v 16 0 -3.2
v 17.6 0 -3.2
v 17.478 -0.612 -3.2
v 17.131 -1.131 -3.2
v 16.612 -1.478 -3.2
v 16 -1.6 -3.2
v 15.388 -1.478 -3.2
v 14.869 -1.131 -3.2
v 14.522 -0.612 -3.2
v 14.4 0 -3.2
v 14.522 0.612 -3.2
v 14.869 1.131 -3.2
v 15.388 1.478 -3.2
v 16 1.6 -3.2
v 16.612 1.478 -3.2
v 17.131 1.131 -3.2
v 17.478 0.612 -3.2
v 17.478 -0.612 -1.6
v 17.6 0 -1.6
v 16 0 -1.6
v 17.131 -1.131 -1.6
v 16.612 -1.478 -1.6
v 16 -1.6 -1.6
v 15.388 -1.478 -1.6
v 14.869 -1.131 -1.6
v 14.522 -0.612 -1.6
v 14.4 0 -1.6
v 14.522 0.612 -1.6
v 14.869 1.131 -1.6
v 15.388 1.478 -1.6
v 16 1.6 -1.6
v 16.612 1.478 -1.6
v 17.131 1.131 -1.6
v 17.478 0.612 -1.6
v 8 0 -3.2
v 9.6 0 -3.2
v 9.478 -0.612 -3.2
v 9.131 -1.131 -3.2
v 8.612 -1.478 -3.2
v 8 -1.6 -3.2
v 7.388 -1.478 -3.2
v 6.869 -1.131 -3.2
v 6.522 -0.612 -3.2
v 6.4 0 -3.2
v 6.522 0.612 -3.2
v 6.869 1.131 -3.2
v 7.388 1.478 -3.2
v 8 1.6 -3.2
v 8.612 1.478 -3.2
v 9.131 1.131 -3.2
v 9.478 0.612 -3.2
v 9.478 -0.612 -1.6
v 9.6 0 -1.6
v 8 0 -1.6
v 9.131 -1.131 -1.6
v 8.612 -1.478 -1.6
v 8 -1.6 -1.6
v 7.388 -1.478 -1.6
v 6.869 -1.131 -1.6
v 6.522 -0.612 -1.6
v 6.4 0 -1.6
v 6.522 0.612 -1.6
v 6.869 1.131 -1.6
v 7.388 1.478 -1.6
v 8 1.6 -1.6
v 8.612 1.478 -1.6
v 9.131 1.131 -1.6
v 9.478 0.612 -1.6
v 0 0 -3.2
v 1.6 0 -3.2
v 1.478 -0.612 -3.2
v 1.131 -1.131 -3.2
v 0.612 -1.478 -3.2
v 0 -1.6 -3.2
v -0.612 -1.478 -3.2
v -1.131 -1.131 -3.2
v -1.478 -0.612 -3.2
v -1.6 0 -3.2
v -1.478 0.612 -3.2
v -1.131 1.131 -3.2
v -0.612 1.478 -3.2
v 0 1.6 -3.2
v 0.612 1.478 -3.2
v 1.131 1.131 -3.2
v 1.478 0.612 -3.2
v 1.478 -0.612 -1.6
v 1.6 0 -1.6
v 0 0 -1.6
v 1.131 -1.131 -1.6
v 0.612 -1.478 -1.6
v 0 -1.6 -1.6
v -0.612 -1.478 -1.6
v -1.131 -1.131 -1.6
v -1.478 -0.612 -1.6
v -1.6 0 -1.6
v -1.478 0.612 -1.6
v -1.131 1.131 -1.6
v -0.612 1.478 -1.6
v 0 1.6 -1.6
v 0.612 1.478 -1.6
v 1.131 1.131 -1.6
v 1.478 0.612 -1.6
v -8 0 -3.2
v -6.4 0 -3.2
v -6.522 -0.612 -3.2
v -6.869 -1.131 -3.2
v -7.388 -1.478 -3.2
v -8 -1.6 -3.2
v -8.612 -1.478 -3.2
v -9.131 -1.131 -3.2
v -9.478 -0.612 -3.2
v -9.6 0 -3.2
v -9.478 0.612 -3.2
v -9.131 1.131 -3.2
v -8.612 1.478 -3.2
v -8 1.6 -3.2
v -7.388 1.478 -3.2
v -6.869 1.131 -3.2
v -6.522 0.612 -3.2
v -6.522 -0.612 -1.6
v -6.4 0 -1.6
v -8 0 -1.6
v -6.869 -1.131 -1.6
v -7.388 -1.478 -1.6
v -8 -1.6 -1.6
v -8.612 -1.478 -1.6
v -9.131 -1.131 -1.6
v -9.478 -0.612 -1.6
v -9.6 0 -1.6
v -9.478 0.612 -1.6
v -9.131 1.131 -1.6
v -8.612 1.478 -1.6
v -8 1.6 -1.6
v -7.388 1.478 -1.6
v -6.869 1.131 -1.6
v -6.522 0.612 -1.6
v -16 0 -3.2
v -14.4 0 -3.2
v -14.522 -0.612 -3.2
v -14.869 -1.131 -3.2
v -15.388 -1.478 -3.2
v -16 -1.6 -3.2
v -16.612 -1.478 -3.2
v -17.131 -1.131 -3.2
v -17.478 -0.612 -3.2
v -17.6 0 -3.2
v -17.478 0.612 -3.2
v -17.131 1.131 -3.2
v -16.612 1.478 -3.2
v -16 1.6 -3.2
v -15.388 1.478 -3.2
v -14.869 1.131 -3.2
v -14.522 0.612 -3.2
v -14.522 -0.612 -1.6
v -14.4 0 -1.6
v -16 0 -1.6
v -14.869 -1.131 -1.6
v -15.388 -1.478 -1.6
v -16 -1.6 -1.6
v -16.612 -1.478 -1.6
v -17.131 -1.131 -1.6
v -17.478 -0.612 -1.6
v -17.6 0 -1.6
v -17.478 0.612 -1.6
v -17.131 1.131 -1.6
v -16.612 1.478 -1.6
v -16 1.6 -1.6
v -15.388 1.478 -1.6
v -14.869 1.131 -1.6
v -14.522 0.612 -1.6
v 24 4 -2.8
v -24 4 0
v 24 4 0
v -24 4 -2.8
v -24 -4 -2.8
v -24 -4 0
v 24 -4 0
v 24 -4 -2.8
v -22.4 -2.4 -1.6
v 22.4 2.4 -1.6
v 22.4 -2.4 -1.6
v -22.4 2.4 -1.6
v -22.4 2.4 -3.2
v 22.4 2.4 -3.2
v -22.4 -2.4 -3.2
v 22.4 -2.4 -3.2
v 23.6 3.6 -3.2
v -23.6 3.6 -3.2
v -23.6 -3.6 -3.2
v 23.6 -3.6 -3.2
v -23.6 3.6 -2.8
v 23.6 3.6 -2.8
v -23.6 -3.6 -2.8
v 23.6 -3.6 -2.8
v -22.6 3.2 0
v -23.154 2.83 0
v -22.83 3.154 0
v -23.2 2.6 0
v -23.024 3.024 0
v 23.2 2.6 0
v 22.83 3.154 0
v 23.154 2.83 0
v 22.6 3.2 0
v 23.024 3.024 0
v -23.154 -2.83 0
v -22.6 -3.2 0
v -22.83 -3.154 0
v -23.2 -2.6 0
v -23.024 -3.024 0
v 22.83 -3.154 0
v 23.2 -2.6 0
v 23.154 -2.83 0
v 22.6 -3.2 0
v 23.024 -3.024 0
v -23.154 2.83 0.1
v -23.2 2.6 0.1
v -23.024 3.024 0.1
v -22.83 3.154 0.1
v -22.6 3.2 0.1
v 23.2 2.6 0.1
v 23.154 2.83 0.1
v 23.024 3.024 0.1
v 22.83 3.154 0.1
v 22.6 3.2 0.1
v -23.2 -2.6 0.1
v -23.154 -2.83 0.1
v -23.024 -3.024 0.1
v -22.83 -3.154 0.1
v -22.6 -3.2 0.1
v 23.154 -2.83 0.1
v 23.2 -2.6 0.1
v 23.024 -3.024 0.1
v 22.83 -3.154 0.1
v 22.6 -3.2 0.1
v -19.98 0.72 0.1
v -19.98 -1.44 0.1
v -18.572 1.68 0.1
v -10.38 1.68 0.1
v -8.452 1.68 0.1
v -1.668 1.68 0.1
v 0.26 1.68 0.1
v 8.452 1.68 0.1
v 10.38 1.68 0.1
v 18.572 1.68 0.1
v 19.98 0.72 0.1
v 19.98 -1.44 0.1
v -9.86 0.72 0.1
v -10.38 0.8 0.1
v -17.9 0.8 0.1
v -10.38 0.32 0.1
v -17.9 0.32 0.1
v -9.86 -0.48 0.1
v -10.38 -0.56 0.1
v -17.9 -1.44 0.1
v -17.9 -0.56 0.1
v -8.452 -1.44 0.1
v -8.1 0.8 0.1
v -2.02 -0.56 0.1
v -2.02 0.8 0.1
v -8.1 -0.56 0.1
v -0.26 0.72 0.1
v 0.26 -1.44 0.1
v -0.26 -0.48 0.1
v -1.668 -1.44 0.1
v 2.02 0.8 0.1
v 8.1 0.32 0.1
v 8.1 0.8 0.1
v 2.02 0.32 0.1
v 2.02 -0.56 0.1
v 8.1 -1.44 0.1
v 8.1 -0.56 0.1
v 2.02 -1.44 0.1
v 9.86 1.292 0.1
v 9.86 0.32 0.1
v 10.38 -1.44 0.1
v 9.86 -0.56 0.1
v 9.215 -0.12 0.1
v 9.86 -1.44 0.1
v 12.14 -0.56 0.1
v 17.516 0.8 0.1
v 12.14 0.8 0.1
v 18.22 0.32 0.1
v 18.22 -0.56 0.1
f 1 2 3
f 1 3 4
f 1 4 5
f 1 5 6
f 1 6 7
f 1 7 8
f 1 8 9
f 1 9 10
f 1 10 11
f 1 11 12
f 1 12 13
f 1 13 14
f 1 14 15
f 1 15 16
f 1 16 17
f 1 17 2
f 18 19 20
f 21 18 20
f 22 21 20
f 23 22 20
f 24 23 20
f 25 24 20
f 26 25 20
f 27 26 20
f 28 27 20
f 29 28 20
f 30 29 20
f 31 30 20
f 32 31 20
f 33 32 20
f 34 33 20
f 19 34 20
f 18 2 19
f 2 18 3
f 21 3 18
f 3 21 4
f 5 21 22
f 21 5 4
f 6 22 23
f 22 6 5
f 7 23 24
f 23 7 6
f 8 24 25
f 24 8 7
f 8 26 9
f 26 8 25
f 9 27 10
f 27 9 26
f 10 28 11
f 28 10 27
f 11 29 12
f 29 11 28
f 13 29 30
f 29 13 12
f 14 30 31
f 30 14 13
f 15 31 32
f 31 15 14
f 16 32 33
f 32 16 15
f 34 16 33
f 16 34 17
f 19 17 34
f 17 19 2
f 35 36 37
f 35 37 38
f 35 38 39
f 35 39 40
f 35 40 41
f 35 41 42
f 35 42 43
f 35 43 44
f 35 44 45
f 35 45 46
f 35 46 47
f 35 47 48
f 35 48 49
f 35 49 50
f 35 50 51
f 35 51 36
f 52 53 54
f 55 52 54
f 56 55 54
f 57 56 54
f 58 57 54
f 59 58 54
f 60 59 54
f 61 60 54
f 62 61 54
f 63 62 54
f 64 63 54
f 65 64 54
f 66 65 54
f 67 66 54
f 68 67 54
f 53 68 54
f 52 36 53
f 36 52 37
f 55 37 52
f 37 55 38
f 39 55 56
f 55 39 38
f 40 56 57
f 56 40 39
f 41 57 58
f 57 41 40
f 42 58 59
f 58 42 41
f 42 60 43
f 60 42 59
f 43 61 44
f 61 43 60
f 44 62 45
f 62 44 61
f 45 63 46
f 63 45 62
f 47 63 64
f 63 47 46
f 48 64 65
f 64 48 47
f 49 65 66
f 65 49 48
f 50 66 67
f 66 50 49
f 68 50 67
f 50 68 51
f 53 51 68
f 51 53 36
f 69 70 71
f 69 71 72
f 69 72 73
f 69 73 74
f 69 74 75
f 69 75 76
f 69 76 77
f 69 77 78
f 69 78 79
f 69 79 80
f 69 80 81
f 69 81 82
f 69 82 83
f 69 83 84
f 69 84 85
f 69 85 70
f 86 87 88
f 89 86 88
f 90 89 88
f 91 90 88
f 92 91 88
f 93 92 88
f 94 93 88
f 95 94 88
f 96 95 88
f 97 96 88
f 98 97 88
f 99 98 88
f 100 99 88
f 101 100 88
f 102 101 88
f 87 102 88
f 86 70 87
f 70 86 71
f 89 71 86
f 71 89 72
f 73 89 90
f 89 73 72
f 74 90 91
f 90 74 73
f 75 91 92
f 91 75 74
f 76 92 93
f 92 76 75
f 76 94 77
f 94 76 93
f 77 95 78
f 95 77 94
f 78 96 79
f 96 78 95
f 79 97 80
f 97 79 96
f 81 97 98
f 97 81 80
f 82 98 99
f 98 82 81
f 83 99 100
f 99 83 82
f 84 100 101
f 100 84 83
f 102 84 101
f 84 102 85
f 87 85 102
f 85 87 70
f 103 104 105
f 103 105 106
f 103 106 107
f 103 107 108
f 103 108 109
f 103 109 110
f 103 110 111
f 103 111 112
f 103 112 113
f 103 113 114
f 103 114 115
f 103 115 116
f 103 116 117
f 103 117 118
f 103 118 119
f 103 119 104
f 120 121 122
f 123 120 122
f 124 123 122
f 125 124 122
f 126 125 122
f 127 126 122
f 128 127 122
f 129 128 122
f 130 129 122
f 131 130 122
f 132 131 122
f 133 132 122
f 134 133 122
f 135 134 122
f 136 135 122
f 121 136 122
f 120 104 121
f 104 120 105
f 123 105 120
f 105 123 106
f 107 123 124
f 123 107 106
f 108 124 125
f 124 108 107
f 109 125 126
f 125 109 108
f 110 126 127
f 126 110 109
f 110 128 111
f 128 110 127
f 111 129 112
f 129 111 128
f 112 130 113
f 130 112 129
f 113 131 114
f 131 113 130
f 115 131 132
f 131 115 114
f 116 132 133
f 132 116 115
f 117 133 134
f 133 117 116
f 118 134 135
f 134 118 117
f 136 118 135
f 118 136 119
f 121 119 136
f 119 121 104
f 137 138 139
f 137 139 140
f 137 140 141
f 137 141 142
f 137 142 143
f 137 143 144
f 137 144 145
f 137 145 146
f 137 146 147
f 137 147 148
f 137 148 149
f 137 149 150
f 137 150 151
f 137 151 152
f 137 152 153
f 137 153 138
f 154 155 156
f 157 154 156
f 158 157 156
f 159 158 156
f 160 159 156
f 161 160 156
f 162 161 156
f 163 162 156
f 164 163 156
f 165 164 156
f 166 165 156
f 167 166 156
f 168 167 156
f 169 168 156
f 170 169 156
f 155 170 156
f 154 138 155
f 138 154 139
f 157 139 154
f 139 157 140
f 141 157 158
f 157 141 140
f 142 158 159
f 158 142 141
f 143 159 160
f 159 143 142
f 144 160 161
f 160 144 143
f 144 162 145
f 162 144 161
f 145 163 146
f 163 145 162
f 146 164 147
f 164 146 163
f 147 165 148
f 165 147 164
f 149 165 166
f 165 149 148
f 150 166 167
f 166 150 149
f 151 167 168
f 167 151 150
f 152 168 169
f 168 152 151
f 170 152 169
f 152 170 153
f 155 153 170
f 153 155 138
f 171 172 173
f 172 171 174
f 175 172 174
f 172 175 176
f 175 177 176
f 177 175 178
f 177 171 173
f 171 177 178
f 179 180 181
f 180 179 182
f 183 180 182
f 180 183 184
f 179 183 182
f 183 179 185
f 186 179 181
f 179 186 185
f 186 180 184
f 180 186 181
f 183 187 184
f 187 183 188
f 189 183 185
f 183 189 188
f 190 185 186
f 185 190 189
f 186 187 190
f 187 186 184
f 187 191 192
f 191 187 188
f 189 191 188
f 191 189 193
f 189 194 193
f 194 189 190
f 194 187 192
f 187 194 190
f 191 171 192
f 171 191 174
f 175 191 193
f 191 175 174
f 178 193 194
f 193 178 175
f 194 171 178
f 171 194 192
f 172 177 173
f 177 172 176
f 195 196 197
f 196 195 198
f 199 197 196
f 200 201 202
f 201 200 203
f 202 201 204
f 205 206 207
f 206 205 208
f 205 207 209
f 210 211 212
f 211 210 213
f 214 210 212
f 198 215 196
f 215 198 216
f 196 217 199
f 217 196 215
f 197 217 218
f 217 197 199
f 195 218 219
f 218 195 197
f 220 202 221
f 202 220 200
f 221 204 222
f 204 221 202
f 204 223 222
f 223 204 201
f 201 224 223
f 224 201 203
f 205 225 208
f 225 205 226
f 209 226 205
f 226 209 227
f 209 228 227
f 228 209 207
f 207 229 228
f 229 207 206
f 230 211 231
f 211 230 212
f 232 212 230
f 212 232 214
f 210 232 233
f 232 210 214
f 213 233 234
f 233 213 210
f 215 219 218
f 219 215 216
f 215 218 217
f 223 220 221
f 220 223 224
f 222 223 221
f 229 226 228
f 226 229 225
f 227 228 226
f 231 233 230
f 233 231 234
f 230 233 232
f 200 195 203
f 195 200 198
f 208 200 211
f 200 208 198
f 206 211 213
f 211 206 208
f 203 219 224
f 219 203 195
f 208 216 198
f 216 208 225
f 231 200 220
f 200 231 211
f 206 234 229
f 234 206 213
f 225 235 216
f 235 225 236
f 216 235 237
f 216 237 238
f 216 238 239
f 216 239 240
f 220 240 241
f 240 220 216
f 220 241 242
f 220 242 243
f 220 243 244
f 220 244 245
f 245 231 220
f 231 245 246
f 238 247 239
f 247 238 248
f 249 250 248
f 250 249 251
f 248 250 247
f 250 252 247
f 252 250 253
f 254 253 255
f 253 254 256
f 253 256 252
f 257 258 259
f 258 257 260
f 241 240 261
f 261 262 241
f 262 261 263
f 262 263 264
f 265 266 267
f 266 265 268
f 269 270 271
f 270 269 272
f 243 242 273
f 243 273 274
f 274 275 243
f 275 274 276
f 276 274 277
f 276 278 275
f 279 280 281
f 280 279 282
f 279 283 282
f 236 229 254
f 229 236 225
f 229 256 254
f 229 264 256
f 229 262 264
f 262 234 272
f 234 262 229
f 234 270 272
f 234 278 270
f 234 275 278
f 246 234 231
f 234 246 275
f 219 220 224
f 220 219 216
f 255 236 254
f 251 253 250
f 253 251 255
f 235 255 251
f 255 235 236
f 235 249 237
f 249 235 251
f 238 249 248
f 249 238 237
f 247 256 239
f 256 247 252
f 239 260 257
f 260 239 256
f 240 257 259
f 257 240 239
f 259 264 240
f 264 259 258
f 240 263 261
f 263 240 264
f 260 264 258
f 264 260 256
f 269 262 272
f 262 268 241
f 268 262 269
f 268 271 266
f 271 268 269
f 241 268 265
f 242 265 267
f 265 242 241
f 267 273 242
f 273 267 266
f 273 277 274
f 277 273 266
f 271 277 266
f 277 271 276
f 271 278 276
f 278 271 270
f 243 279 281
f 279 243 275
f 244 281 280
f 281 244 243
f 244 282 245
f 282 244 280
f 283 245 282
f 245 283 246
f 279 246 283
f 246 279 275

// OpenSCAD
// file: ../p/4-4edge.scad
use <../lib.scad>
function ldraw_lib__4_4edge() = [
// 0 Circle 1.0
// 0 Name: 4-4edge.dat
// 0 Author: James Jessiman
// 0 !LDRAW_ORG Primitive UPDATE 2017-01
// 0 !LICENSE Licensed under CC BY 2.0 and CC BY 4.0 : see CAreadme.txt
// 
// 0 BFC CERTIFY CCW
  [0,"BFC","CERTIFY"],
  [0,"BFC","CCW"],
// 
// 0 !HISTORY 1998-12-15 [PTadmin] Official Update 1998-10
// 0 !HISTORY 2005-12-28 [PTadmin] Official Update 2005-01
// 0 !HISTORY 2007-06-24 [PTadmin] Header formatted for Contributor Agreement
// 0 !HISTORY 2008-07-01 [PTadmin] Official Update 2008-01
// 0 !HISTORY 2017-01-15 [Steffen] BFCed
// 0 !HISTORY 2017-12-30 [PTadmin] Official Update 2017-01
// 
// 
// 2 24 1 0 0 0.9239 0 0.3827
  [2,24,1,0,0,0.9239,0,0.3827],
// 2 24 0.9239 0 0.3827 0.7071 0 0.7071
  [2,24,0.9239,0,0.3827,0.7071,0,0.7071],
// 2 24 0.7071 0 0.7071 0.3827 0 0.9239
  [2,24,0.7071,0,0.7071,0.3827,0,0.9239],
// 2 24 0.3827 0 0.9239 0 0 1
  [2,24,0.3827,0,0.9239,0,0,1],
// 2 24 0 0 1 -0.3827 0 0.9239
  [2,24,0,0,1,-0.3827,0,0.9239],
// 2 24 -0.3827 0 0.9239 -0.7071 0 0.7071
  [2,24,-0.3827,0,0.9239,-0.7071,0,0.7071],
// 2 24 -0.7071 0 0.7071 -0.9239 0 0.3827
  [2,24,-0.7071,0,0.7071,-0.9239,0,0.3827],
// 2 24 -0.9239 0 0.3827 -1 0 -0
  [2,24,-0.9239,0,0.3827,-1,0,-0],
// 2 24 -1 0 -0 -0.9239 0 -0.3827
  [2,24,-1,0,-0,-0.9239,0,-0.3827],
// 2 24 -0.9239 0 -0.3827 -0.7071 0 -0.7071
  [2,24,-0.9239,0,-0.3827,-0.7071,0,-0.7071],
// 2 24 -0.7071 0 -0.7071 -0.3827 0 -0.9239
  [2,24,-0.7071,0,-0.7071,-0.3827,0,-0.9239],
// 2 24 -0.3827 0 -0.9239 0 0 -1
  [2,24,-0.3827,0,-0.9239,0,0,-1],
// 2 24 0 0 -1 0.3827 0 -0.9239
  [2,24,0,0,-1,0.3827,0,-0.9239],
// 2 24 0.3827 0 -0.9239 0.7071 0 -0.7071
  [2,24,0.3827,0,-0.9239,0.7071,0,-0.7071],
// 2 24 0.7071 0 -0.7071 0.9239 0 -0.3827
  [2,24,0.7071,0,-0.7071,0.9239,0,-0.3827],
// 2 24 0.9239 0 -0.3827 1 0 0
  [2,24,0.9239,0,-0.3827,1,0,0],
];
module ldraw_lib__4_4edge(step=0, col=false, unit=2/5, alt=false, line=0.2, solid=!$preview)
    makepoly(ldraw_lib__4_4edge(), step=step, col=col, unit=unit, alt=alt, line=line, solid=solid);
ldraw_lib__4_4edge(line=0.2);
// file: ../p/4-4disc.scad
use <../lib.scad>
function ldraw_lib__4_4disc() = [
// 0 Disc 1.0
// 0 Name: 4-4disc.dat
// 0 Author: James Jessiman
// 0 !LDRAW_ORG Primitive UPDATE 2002-02
// 0 !LICENSE Licensed under CC BY 2.0 and CC BY 4.0 : see CAreadme.txt
// 
// 0 BFC CERTIFY CCW
  [0,"BFC","CERTIFY"],
  [0,"BFC","CCW"],
// 
// 0 !HISTORY 1998-12-15 [PTadmin] Official Update 1998-10
// 0 !HISTORY 2002-03-23 [sbliss] Added BFC statement
// 0 !HISTORY 2002-04-25 [PTadmin] Official Update 2002-02
// 0 !HISTORY 2007-06-24 [PTadmin] Header formatted for Contributor Agreement
// 0 !HISTORY 2008-07-01 [PTadmin] Official Update 2008-01
// 
// 
// 3 16 0 0 0 1 0 0 0.9239 0 0.3827
  [3,16,0,0,0,1,0,0,0.9239,0,0.3827],
// 3 16 0 0 0 0.9239 0 0.3827 0.7071 0 0.7071
  [3,16,0,0,0,0.9239,0,0.3827,0.7071,0,0.7071],
// 3 16 0 0 0 0.7071 0 0.7071 0.3827 0 0.9239
  [3,16,0,0,0,0.7071,0,0.7071,0.3827,0,0.9239],
// 3 16 0 0 0 0.3827 0 0.9239 0 0 1
  [3,16,0,0,0,0.3827,0,0.9239,0,0,1],
// 3 16 0 0 0 0 0 1 -0.3827 0 0.9239
  [3,16,0,0,0,0,0,1,-0.3827,0,0.9239],
// 3 16 0 0 0 -0.3827 0 0.9239 -0.7071 0 0.7071
  [3,16,0,0,0,-0.3827,0,0.9239,-0.7071,0,0.7071],
// 3 16 0 0 0 -0.7071 0 0.7071 -0.9239 0 0.3827
  [3,16,0,0,0,-0.7071,0,0.7071,-0.9239,0,0.3827],
// 3 16 0 0 0 -0.9239 0 0.3827 -1 0 -0
  [3,16,0,0,0,-0.9239,0,0.3827,-1,0,-0],
// 3 16 0 0 0 -1 0 -0 -0.9239 0 -0.3827
  [3,16,0,0,0,-1,0,-0,-0.9239,0,-0.3827],
// 3 16 0 0 0 -0.9239 0 -0.3827 -0.7071 0 -0.7071
  [3,16,0,0,0,-0.9239,0,-0.3827,-0.7071,0,-0.7071],
// 3 16 0 0 0 -0.7071 0 -0.7071 -0.3827 0 -0.9239
  [3,16,0,0,0,-0.7071,0,-0.7071,-0.3827,0,-0.9239],
// 3 16 0 0 0 -0.3827 0 -0.9239 0 0 -1
  [3,16,0,0,0,-0.3827,0,-0.9239,0,0,-1],
// 3 16 0 0 0 0 0 -1 0.3827 0 -0.9239
  [3,16,0,0,0,0,0,-1,0.3827,0,-0.9239],
// 3 16 0 0 0 0.3827 0 -0.9239 0.7071 0 -0.7071
  [3,16,0,0,0,0.3827,0,-0.9239,0.7071,0,-0.7071],
// 3 16 0 0 0 0.7071 0 -0.7071 0.9239 0 -0.3827
  [3,16,0,0,0,0.7071,0,-0.7071,0.9239,0,-0.3827],
// 3 16 0 0 0 0.9239 0 -0.3827 1 0 0
  [3,16,0,0,0,0.9239,0,-0.3827,1,0,0],
// 0
];
module ldraw_lib__4_4disc(step=0, col=false, unit=2/5, alt=false, line=0.2, solid=!$preview)
    makepoly(ldraw_lib__4_4disc(), step=step, col=col, unit=unit, alt=alt, line=line, solid=solid);
ldraw_lib__4_4disc(line=0.2);
// file: ../p/4-4cyli.scad
use <../lib.scad>
$fa=1; $fs=0.2;
function ldraw_lib__4_4cyli(realsolid=false) = [
// 0 Cylinder 1.0
// 0 Name: 4-4cyli.dat
// 0 Author: James Jessiman
// 0 !LDRAW_ORG Primitive UPDATE 2005-01
// 0 !LICENSE Licensed under CC BY 2.0 and CC BY 4.0 : see CAreadme.txt
// 
// 0 BFC CERTIFY CCW
  [0,"BFC","CERTIFY"],
  [0,"BFC","CCW"],
// 
// 0 !HISTORY 1998-12-15 [PTadmin] Official Update 1998-10
// 0 !HISTORY 2002-03-23 [sbliss] Added BFC statement; merged headers from files in distributions LDraw 0.27 and Complete.
// 0 !HISTORY 2002-04-25 [PTadmin] Official Update 2002-02
// 0 !HISTORY 2004-12-14 [guyvivan] BFC CCW
// 0 !HISTORY 2005-12-28 [PTadmin] Official Update 2005-01
// 0 !HISTORY 2007-06-24 [PTadmin] Header formatted for Contributor Agreement
// 0 !HISTORY 2008-07-01 [PTadmin] Official Update 2008-01
// 
// 
// 4 16 1 1 0 0.9239 1 0.3827 0.9239 0 0.3827 1 0 0
  [4,16,1,1,0,0.9239,1,0.3827,0.9239,0,0.3827,1,0,0],
// 5 24 1 0 0 1 1 0 0.9239 0 0.3827 0.9239 0 -0.3827
  [5,24,1,0,0,1,1,0,0.9239,0,0.3827,0.9239,0,-0.3827],
// 4 16 0.9239 1 0.3827 0.7071 1 0.7071 0.7071 0 0.7071 0.9239 0 0.3827
  [4,16,0.9239,1,0.3827,0.7071,1,0.7071,0.7071,0,0.7071,0.9239,0,0.3827],
// 5 24 0.9239 0 0.3827 0.9239 1 0.3827 0.7071 0 0.7071 1 0 0
  [5,24,0.9239,0,0.3827,0.9239,1,0.3827,0.7071,0,0.7071,1,0,0],
// 4 16 0.7071 1 0.7071 0.3827 1 0.9239 0.3827 0 0.9239 0.7071 0 0.7071
  [4,16,0.7071,1,0.7071,0.3827,1,0.9239,0.3827,0,0.9239,0.7071,0,0.7071],
// 5 24 0.7071 0 0.7071 0.7071 1 0.7071 0.3827 0 0.9239 0.9239 0 0.3827
  [5,24,0.7071,0,0.7071,0.7071,1,0.7071,0.3827,0,0.9239,0.9239,0,0.3827],
// 4 16 0.3827 1 0.9239 0 1 1 0 0 1 0.3827 0 0.9239
  [4,16,0.3827,1,0.9239,0,1,1,0,0,1,0.3827,0,0.9239],
// 5 24 0.3827 0 0.9239 0.3827 1 0.9239 0 0 1 0.7071 0 0.7071
  [5,24,0.3827,0,0.9239,0.3827,1,0.9239,0,0,1,0.7071,0,0.7071],
// 4 16 0 1 1 -0.3827 1 0.9239 -0.3827 0 0.9239 0 0 1
  [4,16,0,1,1,-0.3827,1,0.9239,-0.3827,0,0.9239,0,0,1],
// 5 24 0 0 1 0 1 1 -0.3827 0 0.9239 0.3827 0 0.9239
  [5,24,0,0,1,0,1,1,-0.3827,0,0.9239,0.3827,0,0.9239],
// 4 16 -0.3827 1 0.9239 -0.7071 1 0.7071 -0.7071 0 0.7071 -0.3827 0 0.9239
  [4,16,-0.3827,1,0.9239,-0.7071,1,0.7071,-0.7071,0,0.7071,-0.3827,0,0.9239],
// 5 24 -0.3827 0 0.9239 -0.3827 1 0.9239 -0.7071 0 0.7071 0 0 1
  [5,24,-0.3827,0,0.9239,-0.3827,1,0.9239,-0.7071,0,0.7071,0,0,1],
// 4 16 -0.7071 1 0.7071 -0.9239 1 0.3827 -0.9239 0 0.3827 -0.7071 0 0.7071
  [4,16,-0.7071,1,0.7071,-0.9239,1,0.3827,-0.9239,0,0.3827,-0.7071,0,0.7071],
// 5 24 -0.7071 0 0.7071 -0.7071 1 0.7071 -0.9239 0 0.3827 -0.3827 0 0.9239
  [5,24,-0.7071,0,0.7071,-0.7071,1,0.7071,-0.9239,0,0.3827,-0.3827,0,0.9239],
// 4 16 -0.9239 1 0.3827 -1 1 0 -1 0 0 -0.9239 0 0.3827
  [4,16,-0.9239,1,0.3827,-1,1,0,-1,0,0,-0.9239,0,0.3827],
// 5 24 -0.9239 0 0.3827 -0.9239 1 0.3827 -1 0 0 -0.7071 0 0.7071
  [5,24,-0.9239,0,0.3827,-0.9239,1,0.3827,-1,0,0,-0.7071,0,0.7071],
// 4 16 -1 1 0 -0.9239 1 -0.3827 -0.9239 0 -0.3827 -1 0 0
  [4,16,-1,1,0,-0.9239,1,-0.3827,-0.9239,0,-0.3827,-1,0,0],
// 5 24 -1 0 0 -1 1 0 -0.9239 0 -0.3827 -0.9239 0 0.3827
  [5,24,-1,0,0,-1,1,0,-0.9239,0,-0.3827,-0.9239,0,0.3827],
// 4 16 -0.9239 1 -0.3827 -0.7071 1 -0.7071 -0.7071 0 -0.7071 -0.9239 0 -0.3827
  [4,16,-0.9239,1,-0.3827,-0.7071,1,-0.7071,-0.7071,0,-0.7071,-0.9239,0,-0.3827],
// 5 24 -0.9239 0 -0.3827 -0.9239 1 -0.3827 -0.7071 0 -0.7071 -1 0 0
  [5,24,-0.9239,0,-0.3827,-0.9239,1,-0.3827,-0.7071,0,-0.7071,-1,0,0],
// 4 16 -0.7071 1 -0.7071 -0.3827 1 -0.9239 -0.3827 0 -0.9239 -0.7071 0 -0.7071
  [4,16,-0.7071,1,-0.7071,-0.3827,1,-0.9239,-0.3827,0,-0.9239,-0.7071,0,-0.7071],
// 5 24 -0.7071 0 -0.7071 -0.7071 1 -0.7071 -0.3827 0 -0.9239 -0.9239 0 -0.3827
  [5,24,-0.7071,0,-0.7071,-0.7071,1,-0.7071,-0.3827,0,-0.9239,-0.9239,0,-0.3827],
// 4 16 -0.3827 1 -0.9239 0 1 -1 0 0 -1 -0.3827 0 -0.9239
  [4,16,-0.3827,1,-0.9239,0,1,-1,0,0,-1,-0.3827,0,-0.9239],
// 5 24 -0.3827 0 -0.9239 -0.3827 1 -0.9239 0 0 -1 -0.7071 0 -0.7071
  [5,24,-0.3827,0,-0.9239,-0.3827,1,-0.9239,0,0,-1,-0.7071,0,-0.7071],
// 4 16 0 1 -1 0.3827 1 -0.9239 0.3827 0 -0.9239 0 0 -1
  [4,16,0,1,-1,0.3827,1,-0.9239,0.3827,0,-0.9239,0,0,-1],
// 5 24 0 0 -1 0 1 -1 0.3827 0 -0.9239 -0.3827 0 -0.9239
  [5,24,0,0,-1,0,1,-1,0.3827,0,-0.9239,-0.3827,0,-0.9239],
// 4 16 0.3827 1 -0.9239 0.7071 1 -0.7071 0.7071 0 -0.7071 0.3827 0 -0.9239
  [4,16,0.3827,1,-0.9239,0.7071,1,-0.7071,0.7071,0,-0.7071,0.3827,0,-0.9239],
// 5 24 0.3827 0 -0.9239 0.3827 1 -0.9239 0.7071 0 -0.7071 0 0 -1
  [5,24,0.3827,0,-0.9239,0.3827,1,-0.9239,0.7071,0,-0.7071,0,0,-1],
// 4 16 0.7071 1 -0.7071 0.9239 1 -0.3827 0.9239 0 -0.3827 0.7071 0 -0.7071
  [4,16,0.7071,1,-0.7071,0.9239,1,-0.3827,0.9239,0,-0.3827,0.7071,0,-0.7071],
// 5 24 0.7071 0 -0.7071 0.7071 1 -0.7071 0.9239 0 -0.3827 0.3827 0 -0.9239
  [5,24,0.7071,0,-0.7071,0.7071,1,-0.7071,0.9239,0,-0.3827,0.3827,0,-0.9239],
// 4 16 0.9239 1 -0.3827 1 1 0 1 0 0 0.9239 0 -0.3827
  [4,16,0.9239,1,-0.3827,1,1,0,1,0,0,0.9239,0,-0.3827],
// 5 24 0.9239 0 -0.3827 0.9239 1 -0.3827 1 0 0 0.7071 0 -0.7071
  [5,24,0.9239,0,-0.3827,0.9239,1,-0.3827,1,0,0,0.7071,0,-0.7071],
// 0
];
module ldraw_lib__4_4cyli(step=0, col=false, unit=2/5, alt=false, line=0.2, solid=!$preview)
    makepoly(ldraw_lib__4_4cyli(solid), step=step, col=col, unit=unit, alt=alt, line=line, solid=solid);
ldraw_lib__4_4cyli(line=0.2);
// file: ../p/stud3.scad
use <../lib.scad>
use <4-4cyli.scad>
use <4-4disc.scad>
use <4-4edge.scad>
function ldraw_lib__stud3() = [
// 0 Stud Tube Solid
// 0 Name: stud3.dat
// 0 Author: James Jessiman
// 0 !LDRAW_ORG Primitive UPDATE 2012-01
// 0 !LICENSE Licensed under CC BY 4.0 : see CAreadme.txt
// 
// 0 BFC CERTIFY CCW
  [0,"BFC","CERTIFY"],
  [0,"BFC","CCW"],
// 
// 0 !HISTORY 2002-04-04 [sbliss] Modified for BFC compliance
// 0 !HISTORY 2002-04-25 [PTadmin] Official Update 2002-02
// 0 !HISTORY 2007-06-24 [PTadmin] Header formatted for Contributor Agreement
// 0 !HISTORY 2008-07-01 [PTadmin] Official Update 2008-01
// 0 !HISTORY 2012-02-16 [Philo] Changed to CCW
// 0 !HISTORY 2012-03-30 [PTadmin] Official Update 2012-01
// 
// 
// 1 16 0 -4 0 4 0 0 0 1 0 0 0 4 4-4edge.dat
  [1,16,0,-4,0,4,0,0,0,1,0,0,0,4, ldraw_lib__4_4edge()],
// 1 16 0 0 0 4 0 0 0 1 0 0 0 4 4-4edge.dat
  [1,16,0,0,0,4,0,0,0,1,0,0,0,4, ldraw_lib__4_4edge()],
// 1 16 0 -4 0 4 0 0 0 1 0 0 0 4 4-4disc.dat
  [1,16,0,-4,0,4,0,0,0,1,0,0,0,4, ldraw_lib__4_4disc()],
  [-1,16,0,0,0,4,0,0,0,-1,0,0,0,4, ldraw_lib__4_4disc()],
// 1 16 0 -4 0 4 0 0 0 4 0 0 0 4 4-4cyli.dat
  [1,16,0,-4,0,4,0,0,0,4,0,0,0,4, ldraw_lib__4_4cyli()],
];
module ldraw_lib__stud3(step=0, col=false, unit=2/5, alt=false, line=0.2, solid=!$preview)
    makepoly(ldraw_lib__stud3(), step=step, col=col, unit=unit, alt=alt, line=line, solid=solid);
ldraw_lib__stud3(line=0.2);
// file: ../p/box5.scad
use <../lib.scad>
function ldraw_lib__box5() = [
// 0 Box with 5 Faces and All Edges
// 0 Name: box5.dat
// 0 Author: James Jessiman
// 0 !LDRAW_ORG Primitive UPDATE 2012-01
// 0 !LICENSE Licensed under CC BY 2.0 and CC BY 4.0 : see CAreadme.txt
// 
// 0 BFC CERTIFY CCW
  [0,"BFC","CERTIFY"],
  [0,"BFC","CCW"],
// 
// 0 !HISTORY 2002-04-03 [sbliss] Modified for BFC compliance
// 0 !HISTORY 2002-04-25 [PTadmin] Official Update 2002-02
// 0 !HISTORY 2007-06-24 [PTadmin] Header formatted for Contributor Agreement
// 0 !HISTORY 2008-07-01 [PTadmin] Official Update 2008-01
// 0 !HISTORY 2012-02-16 [Philo] Changed to CCW
// 0 !HISTORY 2012-03-30 [PTadmin] Official Update 2012-01
// 
// 
// 2 24 1 1 1 -1 1 1
  [2,24,1,1,1,-1,1,1],
// 2 24 -1 1 1 -1 1 -1
  [2,24,-1,1,1,-1,1,-1],
// 2 24 -1 1 -1 1 1 -1
  [2,24,-1,1,-1,1,1,-1],
// 2 24 1 1 -1 1 1 1
  [2,24,1,1,-1,1,1,1],
// 2 24 1 0 1 -1 0 1
  [2,24,1,0,1,-1,0,1],
// 2 24 -1 0 1 -1 0 -1
  [2,24,-1,0,1,-1,0,-1],
// 2 24 -1 0 -1 1 0 -1
  [2,24,-1,0,-1,1,0,-1],
// 2 24 1 0 -1 1 0 1
  [2,24,1,0,-1,1,0,1],
// 2 24 1 0 1 1 1 1
  [2,24,1,0,1,1,1,1],
// 2 24 -1 0 1 -1 1 1
  [2,24,-1,0,1,-1,1,1],
// 2 24 1 0 -1 1 1 -1
  [2,24,1,0,-1,1,1,-1],
// 2 24 -1 0 -1 -1 1 -1
  [2,24,-1,0,-1,-1,1,-1],
// 4 16 -1 1 1 1 1 1 1 1 -1 -1 1 -1
  [4,16,-1,1,1,1,1,1,1,1,-1,-1,1,-1],
// 4 16 -1 1 1 -1 0 1 1 0 1 1 1 1
  [4,16,-1,1,1,-1,0,1,1,0,1,1,1,1],
// 4 16 -1 1 -1 -1 0 -1 -1 0 1 -1 1 1
  [4,16,-1,1,-1,-1,0,-1,-1,0,1,-1,1,1],
// 4 16 1 1 -1 1 0 -1 -1 0 -1 -1 1 -1
  [4,16,1,1,-1,1,0,-1,-1,0,-1,-1,1,-1],
// 4 16 1 1 1 1 0 1 1 0 -1 1 1 -1
  [4,16,1,1,1,1,0,1,1,0,-1,1,1,-1],
];
makepoly(ldraw_lib__box5(), line=0.2);
// file: ../p/box4.scad
use <../lib.scad>
function ldraw_lib__box4() = [
// 0 Box with 4 Faces (2 Parallel Pairs) and All Edges
// 0 Name: box4.dat
// 0 Author: James Jessiman
// 0 !LDRAW_ORG Primitive UPDATE 2012-01
// 0 !LICENSE Licensed under CC BY 4.0 : see CAreadme.txt
// 
// 0 BFC CERTIFY CCW
  [0,"BFC","CERTIFY"],
  [0,"BFC","CCW"],
// 
// 0 !HISTORY 2002-04-03 [sbliss] Modified for BFC compliance
// 0 !HISTORY 2002-04-25 [PTadmin] Official Update 2002-02
// 0 !HISTORY 2007-06-24 [PTadmin] Header formatted for Contributor Agreement
// 0 !HISTORY 2008-07-01 [PTadmin] Official Update 2008-01
// 0 !HISTORY 2012-02-16 [Philo] Changed to CCW
// 0 !HISTORY 2012-03-30 [PTadmin] Official Update 2012-01
// 
// 
// 2 24 1 1 1 -1 1 1
  [2,24,1,1,1,-1,1,1],
// 2 24 -1 1 1 -1 1 -1
  [2,24,-1,1,1,-1,1,-1],
// 2 24 -1 1 -1 1 1 -1
  [2,24,-1,1,-1,1,1,-1],
// 2 24 1 1 -1 1 1 1
  [2,24,1,1,-1,1,1,1],
// 2 24 1 0 1 -1 0 1
  [2,24,1,0,1,-1,0,1],
// 2 24 -1 0 1 -1 0 -1
  [2,24,-1,0,1,-1,0,-1],
// 2 24 -1 0 -1 1 0 -1
  [2,24,-1,0,-1,1,0,-1],
// 2 24 1 0 -1 1 0 1
  [2,24,1,0,-1,1,0,1],
// 2 24 1 0 1 1 1 1
  [2,24,1,0,1,1,1,1],
// 2 24 -1 0 1 -1 1 1
  [2,24,-1,0,1,-1,1,1],
// 2 24 1 0 -1 1 1 -1
  [2,24,1,0,-1,1,1,-1],
// 2 24 -1 0 -1 -1 1 -1
  [2,24,-1,0,-1,-1,1,-1],
// 4 16 -1 1 1 -1 0 1 1 0 1 1 1 1
  [4,16,-1,1,1,-1,0,1,1,0,1,1,1,1],
// 4 16 -1 1 -1 -1 0 -1 -1 0 1 -1 1 1
  [4,16,-1,1,-1,-1,0,-1,-1,0,1,-1,1,1],
// 4 16 1 1 -1 1 0 -1 -1 0 -1 -1 1 -1
  [4,16,1,1,-1,1,0,-1,-1,0,-1,-1,1,-1],
// 4 16 1 1 1 1 0 1 1 0 -1 1 1 -1
  [4,16,1,1,1,1,0,1,1,0,-1,1,1,-1],
];
module ldraw_lib__box4(step=0, col=false, unit=2/5, alt=false, line=0.2, solid=!$preview)
    makepoly(ldraw_lib__box4(), step=step, col=col, unit=unit, alt=alt, line=line, solid=solid);
ldraw_lib__box4(line=0.2);
// file: s/6636s01.scad
use <../../lib.scad>
use <../../p/box4.scad>
use <../../p/box5.scad>
use <../../p/stud3.scad>
function ldraw_lib__s__6636s01() = [
// 0 ~Tile  1 x  6 without Top Face
// 0 Name: s\6636s01.dat
// 0 Author: C.L.Rasmussen [johnny-thunder]
// 0 !LDRAW_ORG Subpart UPDATE 2009-03
// 0 !LICENSE Licensed under CC BY 2.0 and CC BY 4.0 : see CAreadme.txt
// 
// 0 BFC CERTIFY CCW
  [0,"BFC","CERTIFY"],
  [0,"BFC","CCW"],
// 
// 0 !HISTORY 2009-12-29 [PTadmin] Official Update 2009-03
// 
// 
// 1 16 40 4 0 1 0 0 0 -1 0 0 0 -1 stud3.dat
  [1,16,40,4,0,1,0,0,0,-1,0,0,0,-1, ldraw_lib__stud3()],
// 1 16 20 4 0 1 0 0 0 -1 0 0 0 -1 stud3.dat
  [1,16,20,4,0,1,0,0,0,-1,0,0,0,-1, ldraw_lib__stud3()],
// 1 16 0 4 0 1 0 0 0 -1 0 0 0 -1 stud3.dat
  [1,16,0,4,0,1,0,0,0,-1,0,0,0,-1, ldraw_lib__stud3()],
// 1 16 -20 4 0 1 0 0 0 -1 0 0 0 -1 stud3.dat
  [1,16,-20,4,0,1,0,0,0,-1,0,0,0,-1, ldraw_lib__stud3()],
// 1 16 -40 4 0 1 0 0 0 -1 0 0 0 -1 stud3.dat
  [1,16,-40,4,0,1,0,0,0,-1,0,0,0,-1, ldraw_lib__stud3()],
// 1 16 0 7 0 60 0 0 0 -7 0 0 0 10 box4.dat
  [1,16,0,7,0,60,0,0,0,-7,0,0,0,10, ldraw_lib__box4()],
// 0 BFC INVERTNEXT
  [0,"BFC","INVERTNEXT"],
// 1 16 0 8 0 56 0 0 0 -4 0 0 0 6 box5.dat
  [1,16,0,8,0,56,0,0,0,-4,0,0,0,6, ldraw_lib__box5()],
// 4 16 59 8 9 56 8 6 -56 8 6 -59 8 9
  [4,16,59,8,9,56,8,6,-56,8,6,-59,8,9],
// 4 16 -59 8 9 -56 8 6 -56 8 -6 -59 8 -9
  [4,16,-59,8,9,-56,8,6,-56,8,-6,-59,8,-9],
// 4 16 -59 8 -9 -56 8 -6 56 8 -6 59 8 -9
  [4,16,-59,8,-9,-56,8,-6,56,8,-6,59,8,-9],
// 4 16 59 8 -9 56 8 -6 56 8 6 59 8 9
  [4,16,59,8,-9,56,8,-6,56,8,6,59,8,9],
// 1 16 0 8 0 59 0 0 0 -1 0 0 0 9 box4.dat
  [1,16,0,8,0,59,0,0,0,-1,0,0,0,9, ldraw_lib__box4()],
// 4 16 60 7 10 59 7 9 -59 7 9 -60 7 10
  [4,16,60,7,10,59,7,9,-59,7,9,-60,7,10],
// 4 16 -60 7 10 -59 7 9 -59 7 -9 -60 7 -10
  [4,16,-60,7,10,-59,7,9,-59,7,-9,-60,7,-10],
// 4 16 -60 7 -10 -59 7 -9 59 7 -9 60 7 -10
  [4,16,-60,7,-10,-59,7,-9,59,7,-9,60,7,-10],
// 4 16 60 7 -10 59 7 -9 59 7 9 60 7 10
  [4,16,60,7,-10,59,7,-9,59,7,9,60,7,10],
// 0
];
makepoly(ldraw_lib__s__6636s01(), line=0.2);
// file: ../p/1-4cyli.scad
use <../lib.scad>
function ldraw_lib__1_4cyli() = [
// 0 Cylinder 0.25
// 0 Name: 1-4cyli.dat
// 0 Author: James Jessiman
// 0 !LDRAW_ORG Primitive UPDATE 2012-01
// 0 !LICENSE Licensed under CC BY 2.0 and CC BY 4.0 : see CAreadme.txt
// 
// 0 BFC CERTIFY CCW
  [0,"BFC","CERTIFY"],
  [0,"BFC","CCW"],
// 
// 0 !HISTORY 2002-03-23 [sbliss] Added BFC statement.
// 0 !HISTORY 2002-04-25 [PTadmin] Official Update 2002-02
// 0 !HISTORY 2007-06-22 [PTadmin] Header formatted for Contributor Agreement
// 0 !HISTORY 2008-07-01 [PTadmin] Official Update 2008-01
// 0 !HISTORY 2012-02-16 [Philo] Changed to CCW
// 0 !HISTORY 2012-03-30 [PTadmin] Official Update 2012-01
// 
// 
// 4 16 1 1 0 0.9239 1 0.3827 0.9239 0 0.3827 1 0 0
  [4,16,1,1,0,0.9239,1,0.3827,0.9239,0,0.3827,1,0,0],
// 5 24 1 0 0 1 1 0 0.9239 0 0.3827 1 0 -1
  [5,24,1,0,0,1,1,0,0.9239,0,0.3827,1,0,-1],
// 4 16 0.9239 1 0.3827 0.7071 1 0.7071 0.7071 0 0.7071 0.9239 0 0.3827
  [4,16,0.9239,1,0.3827,0.7071,1,0.7071,0.7071,0,0.7071,0.9239,0,0.3827],
// 5 24 0.9239 0 0.3827 0.9239 1 0.3827 0.7071 0 0.7071 1 0 0
  [5,24,0.9239,0,0.3827,0.9239,1,0.3827,0.7071,0,0.7071,1,0,0],
// 4 16 0.7071 1 0.7071 0.3827 1 0.9239 0.3827 0 0.9239 0.7071 0 0.7071
  [4,16,0.7071,1,0.7071,0.3827,1,0.9239,0.3827,0,0.9239,0.7071,0,0.7071],
// 5 24 0.7071 0 0.7071 0.7071 1 0.7071 0.3827 0 0.9239 0.9239 0 0.3827
  [5,24,0.7071,0,0.7071,0.7071,1,0.7071,0.3827,0,0.9239,0.9239,0,0.3827],
// 4 16 0.3827 1 0.9239 0 1 1 0 0 1 0.3827 0 0.9239
  [4,16,0.3827,1,0.9239,0,1,1,0,0,1,0.3827,0,0.9239],
// 5 24 0.3827 0 0.9239 0.3827 1 0.9239 0 0 1 0.7071 0 0.7071
  [5,24,0.3827,0,0.9239,0.3827,1,0.9239,0,0,1,0.7071,0,0.7071],
// 5 24 0 0 1 0 1 1 0.3827 0 0.9239 -1 0 1
  [5,24,0,0,1,0,1,1,0.3827,0,0.9239,-1,0,1],
];
module ldraw_lib__1_4cyli(step=0, col=false, unit=2/5, alt=false, line=0.2, solid=!$preview)
    makepoly(ldraw_lib__1_4cyli(), step=step, col=col, unit=unit, alt=alt, line=line, solid=solid);
ldraw_lib__1_4cyli(line=0.2);
// file: ../p/1-4chrd.scad
use <../lib.scad>
$fa=1; $fs=0.2;
function ldraw_lib__1_4chrd(realsolid=false) = [
// 0 Chord 0.25
// 0 Name: 1-4chrd.dat
// 0 Author: Tony Hafner [hafhead]
// 0 !LDRAW_ORG Primitive UPDATE 2012-02
// 0 !LICENSE Licensed under CC BY 2.0 and CC BY 4.0 : see CAreadme.txt
// 
// 0 BFC CERTIFY CCW
  [0,"BFC","CERTIFY"],
  [0,"BFC","CCW"],
// 
// 0 !HISTORY 2004-04-22 [PTadmin] Official Update 2004-02
// 0 !HISTORY 2007-10-09 [PTadmin] Header formatted for Contributor Agreement
// 0 !HISTORY 2008-07-01 [PTadmin] Official Update 2008-01
// 0 !HISTORY 2012-08-02 [MMR1988] Re-creation with PrimGen2 and Rectifier
// 0 !HISTORY 2012-08-09 [PTadmin] Official Update 2012-02
// 
// 
// 4 16 0.9239 0 0.3827 0.3827 0 0.9239 0 0 1 1 0 0
  [4,16,0.9239,0,0.3827,0.3827,0,0.9239,0,0,1,1,0,0],
// 3 16 0.7071 0 0.7071 0.3827 0 0.9239 0.9239 0 0.3827
  [3,16,0.7071,0,0.7071,0.3827,0,0.9239,0.9239,0,0.3827],
];
module ldraw_lib__1_4chrd(step=0, col=false, unit=2/5, alt=false, line=0.2, solid=!$preview)
    makepoly(ldraw_lib__1_4chrd(solid), step=step, col=col, unit=unit, alt=alt, line=line, solid=solid);
ldraw_lib__1_4chrd(line=0.2);
// file: 6636.scad
use <../lib.scad>
use <s/6636s01.scad>
function ldraw_lib__6636() = [
// 0 Tile  1 x  6
// 0 Name: 6636.dat
// 0 Author: James Jessiman
// 0 !LDRAW_ORG Part UPDATE 2009-03
// 0 !LICENSE Licensed under CC BY 2.0 and CC BY 4.0 : see CAreadme.txt
// 
// 0 BFC CERTIFY CCW
  [0,"BFC","CERTIFY"],
  [0,"BFC","CCW"],
// 
// 0 !HISTORY 2002-02-15 [BrickCaster] groove
// 0 !HISTORY 2002-08-18 [PTadmin] Official Update 2002-04
// 0 !HISTORY 2004-07-27 [guyvivan] Made BFC Compliant
// 0 !HISTORY 2004-11-06 [PTadmin] Official Update 2004-04
// 0 !HISTORY 2007-07-18 [PTadmin] Header formatted for Contributor Agreement
// 0 !HISTORY 2008-07-01 [PTadmin] Official Update 2008-01
// 0 !HISTORY 2008-07-07 [johnny-thunder] subfiled (2006-07-01)
// 0 !HISTORY 2009-12-29 [PTadmin] Official Update 2009-03
// 
// 
// 1 16 0 0 0 1 0 0 0 1 0 0 0 1 s\6636s01.dat
  [1,16,0,0,0,1,0,0,0,1,0,0,0,1, ldraw_lib__s__6636s01()],
// 4 16 60 0 -10 60 0 10 -60 0 10 -60 0 -10
  [4,16,60,0,-10,60,0,10,-60,0,10,-60,0,-10],
// 0
];
makepoly(ldraw_lib__6636(), line=0.2);
// main file
use <../lib.scad>
use <6141875f.scad>
use <6636.scad>
function ldraw_lib__6636d0m() = [
// 0 Tile  1 x  6 with Metallic Silver "FORD" in Black Stripe on Blue Background Sticker
// 0 Name: 6636d0m.dat
// 0 Author: Alfred Schmitz [AlfredS]
// 0 !LDRAW_ORG Shortcut UPDATE 2026-08
// 0 !LICENSE Licensed under CC BY 4.0 : see CAreadme.txt
// 
// 0 BFC CERTIFY CCW
  [0,"BFC","CERTIFY"],
  [0,"BFC","CCW"],
// 
// 0 !CATEGORY Sticker Shortcut
// 0 !KEYWORDS F-150, Ford, Raptor, Set 75875, Speed Champions
// 
// 0 !HISTORY 2026-08-31 [OrionP] Official Update 2026-08
// 
// 1 16 0 0 0 1 0 0 0 1 0 0 0 1 6636.dat
  [1,16,0,0,0,1,0,0,0,1,0,0,0,1, ldraw_lib__6636()],
// 1 16 0 0 0 1 0 0 0 1 0 0 0 1 6141875f.dat
  [1,16,0,0,0,1,0,0,0,1,0,0,0,1, ldraw_lib__6141875f()],
];
module ldraw_lib__6636d0m(step=0, col=false, unit=2/5, alt=false, line=0.2, solid=!$preview)
    makepoly(ldraw_lib__6636d0m(), step=step, col=col, unit=unit, alt=alt, line=line, solid=solid);
ldraw_lib__6636d0m(line=0.2);
